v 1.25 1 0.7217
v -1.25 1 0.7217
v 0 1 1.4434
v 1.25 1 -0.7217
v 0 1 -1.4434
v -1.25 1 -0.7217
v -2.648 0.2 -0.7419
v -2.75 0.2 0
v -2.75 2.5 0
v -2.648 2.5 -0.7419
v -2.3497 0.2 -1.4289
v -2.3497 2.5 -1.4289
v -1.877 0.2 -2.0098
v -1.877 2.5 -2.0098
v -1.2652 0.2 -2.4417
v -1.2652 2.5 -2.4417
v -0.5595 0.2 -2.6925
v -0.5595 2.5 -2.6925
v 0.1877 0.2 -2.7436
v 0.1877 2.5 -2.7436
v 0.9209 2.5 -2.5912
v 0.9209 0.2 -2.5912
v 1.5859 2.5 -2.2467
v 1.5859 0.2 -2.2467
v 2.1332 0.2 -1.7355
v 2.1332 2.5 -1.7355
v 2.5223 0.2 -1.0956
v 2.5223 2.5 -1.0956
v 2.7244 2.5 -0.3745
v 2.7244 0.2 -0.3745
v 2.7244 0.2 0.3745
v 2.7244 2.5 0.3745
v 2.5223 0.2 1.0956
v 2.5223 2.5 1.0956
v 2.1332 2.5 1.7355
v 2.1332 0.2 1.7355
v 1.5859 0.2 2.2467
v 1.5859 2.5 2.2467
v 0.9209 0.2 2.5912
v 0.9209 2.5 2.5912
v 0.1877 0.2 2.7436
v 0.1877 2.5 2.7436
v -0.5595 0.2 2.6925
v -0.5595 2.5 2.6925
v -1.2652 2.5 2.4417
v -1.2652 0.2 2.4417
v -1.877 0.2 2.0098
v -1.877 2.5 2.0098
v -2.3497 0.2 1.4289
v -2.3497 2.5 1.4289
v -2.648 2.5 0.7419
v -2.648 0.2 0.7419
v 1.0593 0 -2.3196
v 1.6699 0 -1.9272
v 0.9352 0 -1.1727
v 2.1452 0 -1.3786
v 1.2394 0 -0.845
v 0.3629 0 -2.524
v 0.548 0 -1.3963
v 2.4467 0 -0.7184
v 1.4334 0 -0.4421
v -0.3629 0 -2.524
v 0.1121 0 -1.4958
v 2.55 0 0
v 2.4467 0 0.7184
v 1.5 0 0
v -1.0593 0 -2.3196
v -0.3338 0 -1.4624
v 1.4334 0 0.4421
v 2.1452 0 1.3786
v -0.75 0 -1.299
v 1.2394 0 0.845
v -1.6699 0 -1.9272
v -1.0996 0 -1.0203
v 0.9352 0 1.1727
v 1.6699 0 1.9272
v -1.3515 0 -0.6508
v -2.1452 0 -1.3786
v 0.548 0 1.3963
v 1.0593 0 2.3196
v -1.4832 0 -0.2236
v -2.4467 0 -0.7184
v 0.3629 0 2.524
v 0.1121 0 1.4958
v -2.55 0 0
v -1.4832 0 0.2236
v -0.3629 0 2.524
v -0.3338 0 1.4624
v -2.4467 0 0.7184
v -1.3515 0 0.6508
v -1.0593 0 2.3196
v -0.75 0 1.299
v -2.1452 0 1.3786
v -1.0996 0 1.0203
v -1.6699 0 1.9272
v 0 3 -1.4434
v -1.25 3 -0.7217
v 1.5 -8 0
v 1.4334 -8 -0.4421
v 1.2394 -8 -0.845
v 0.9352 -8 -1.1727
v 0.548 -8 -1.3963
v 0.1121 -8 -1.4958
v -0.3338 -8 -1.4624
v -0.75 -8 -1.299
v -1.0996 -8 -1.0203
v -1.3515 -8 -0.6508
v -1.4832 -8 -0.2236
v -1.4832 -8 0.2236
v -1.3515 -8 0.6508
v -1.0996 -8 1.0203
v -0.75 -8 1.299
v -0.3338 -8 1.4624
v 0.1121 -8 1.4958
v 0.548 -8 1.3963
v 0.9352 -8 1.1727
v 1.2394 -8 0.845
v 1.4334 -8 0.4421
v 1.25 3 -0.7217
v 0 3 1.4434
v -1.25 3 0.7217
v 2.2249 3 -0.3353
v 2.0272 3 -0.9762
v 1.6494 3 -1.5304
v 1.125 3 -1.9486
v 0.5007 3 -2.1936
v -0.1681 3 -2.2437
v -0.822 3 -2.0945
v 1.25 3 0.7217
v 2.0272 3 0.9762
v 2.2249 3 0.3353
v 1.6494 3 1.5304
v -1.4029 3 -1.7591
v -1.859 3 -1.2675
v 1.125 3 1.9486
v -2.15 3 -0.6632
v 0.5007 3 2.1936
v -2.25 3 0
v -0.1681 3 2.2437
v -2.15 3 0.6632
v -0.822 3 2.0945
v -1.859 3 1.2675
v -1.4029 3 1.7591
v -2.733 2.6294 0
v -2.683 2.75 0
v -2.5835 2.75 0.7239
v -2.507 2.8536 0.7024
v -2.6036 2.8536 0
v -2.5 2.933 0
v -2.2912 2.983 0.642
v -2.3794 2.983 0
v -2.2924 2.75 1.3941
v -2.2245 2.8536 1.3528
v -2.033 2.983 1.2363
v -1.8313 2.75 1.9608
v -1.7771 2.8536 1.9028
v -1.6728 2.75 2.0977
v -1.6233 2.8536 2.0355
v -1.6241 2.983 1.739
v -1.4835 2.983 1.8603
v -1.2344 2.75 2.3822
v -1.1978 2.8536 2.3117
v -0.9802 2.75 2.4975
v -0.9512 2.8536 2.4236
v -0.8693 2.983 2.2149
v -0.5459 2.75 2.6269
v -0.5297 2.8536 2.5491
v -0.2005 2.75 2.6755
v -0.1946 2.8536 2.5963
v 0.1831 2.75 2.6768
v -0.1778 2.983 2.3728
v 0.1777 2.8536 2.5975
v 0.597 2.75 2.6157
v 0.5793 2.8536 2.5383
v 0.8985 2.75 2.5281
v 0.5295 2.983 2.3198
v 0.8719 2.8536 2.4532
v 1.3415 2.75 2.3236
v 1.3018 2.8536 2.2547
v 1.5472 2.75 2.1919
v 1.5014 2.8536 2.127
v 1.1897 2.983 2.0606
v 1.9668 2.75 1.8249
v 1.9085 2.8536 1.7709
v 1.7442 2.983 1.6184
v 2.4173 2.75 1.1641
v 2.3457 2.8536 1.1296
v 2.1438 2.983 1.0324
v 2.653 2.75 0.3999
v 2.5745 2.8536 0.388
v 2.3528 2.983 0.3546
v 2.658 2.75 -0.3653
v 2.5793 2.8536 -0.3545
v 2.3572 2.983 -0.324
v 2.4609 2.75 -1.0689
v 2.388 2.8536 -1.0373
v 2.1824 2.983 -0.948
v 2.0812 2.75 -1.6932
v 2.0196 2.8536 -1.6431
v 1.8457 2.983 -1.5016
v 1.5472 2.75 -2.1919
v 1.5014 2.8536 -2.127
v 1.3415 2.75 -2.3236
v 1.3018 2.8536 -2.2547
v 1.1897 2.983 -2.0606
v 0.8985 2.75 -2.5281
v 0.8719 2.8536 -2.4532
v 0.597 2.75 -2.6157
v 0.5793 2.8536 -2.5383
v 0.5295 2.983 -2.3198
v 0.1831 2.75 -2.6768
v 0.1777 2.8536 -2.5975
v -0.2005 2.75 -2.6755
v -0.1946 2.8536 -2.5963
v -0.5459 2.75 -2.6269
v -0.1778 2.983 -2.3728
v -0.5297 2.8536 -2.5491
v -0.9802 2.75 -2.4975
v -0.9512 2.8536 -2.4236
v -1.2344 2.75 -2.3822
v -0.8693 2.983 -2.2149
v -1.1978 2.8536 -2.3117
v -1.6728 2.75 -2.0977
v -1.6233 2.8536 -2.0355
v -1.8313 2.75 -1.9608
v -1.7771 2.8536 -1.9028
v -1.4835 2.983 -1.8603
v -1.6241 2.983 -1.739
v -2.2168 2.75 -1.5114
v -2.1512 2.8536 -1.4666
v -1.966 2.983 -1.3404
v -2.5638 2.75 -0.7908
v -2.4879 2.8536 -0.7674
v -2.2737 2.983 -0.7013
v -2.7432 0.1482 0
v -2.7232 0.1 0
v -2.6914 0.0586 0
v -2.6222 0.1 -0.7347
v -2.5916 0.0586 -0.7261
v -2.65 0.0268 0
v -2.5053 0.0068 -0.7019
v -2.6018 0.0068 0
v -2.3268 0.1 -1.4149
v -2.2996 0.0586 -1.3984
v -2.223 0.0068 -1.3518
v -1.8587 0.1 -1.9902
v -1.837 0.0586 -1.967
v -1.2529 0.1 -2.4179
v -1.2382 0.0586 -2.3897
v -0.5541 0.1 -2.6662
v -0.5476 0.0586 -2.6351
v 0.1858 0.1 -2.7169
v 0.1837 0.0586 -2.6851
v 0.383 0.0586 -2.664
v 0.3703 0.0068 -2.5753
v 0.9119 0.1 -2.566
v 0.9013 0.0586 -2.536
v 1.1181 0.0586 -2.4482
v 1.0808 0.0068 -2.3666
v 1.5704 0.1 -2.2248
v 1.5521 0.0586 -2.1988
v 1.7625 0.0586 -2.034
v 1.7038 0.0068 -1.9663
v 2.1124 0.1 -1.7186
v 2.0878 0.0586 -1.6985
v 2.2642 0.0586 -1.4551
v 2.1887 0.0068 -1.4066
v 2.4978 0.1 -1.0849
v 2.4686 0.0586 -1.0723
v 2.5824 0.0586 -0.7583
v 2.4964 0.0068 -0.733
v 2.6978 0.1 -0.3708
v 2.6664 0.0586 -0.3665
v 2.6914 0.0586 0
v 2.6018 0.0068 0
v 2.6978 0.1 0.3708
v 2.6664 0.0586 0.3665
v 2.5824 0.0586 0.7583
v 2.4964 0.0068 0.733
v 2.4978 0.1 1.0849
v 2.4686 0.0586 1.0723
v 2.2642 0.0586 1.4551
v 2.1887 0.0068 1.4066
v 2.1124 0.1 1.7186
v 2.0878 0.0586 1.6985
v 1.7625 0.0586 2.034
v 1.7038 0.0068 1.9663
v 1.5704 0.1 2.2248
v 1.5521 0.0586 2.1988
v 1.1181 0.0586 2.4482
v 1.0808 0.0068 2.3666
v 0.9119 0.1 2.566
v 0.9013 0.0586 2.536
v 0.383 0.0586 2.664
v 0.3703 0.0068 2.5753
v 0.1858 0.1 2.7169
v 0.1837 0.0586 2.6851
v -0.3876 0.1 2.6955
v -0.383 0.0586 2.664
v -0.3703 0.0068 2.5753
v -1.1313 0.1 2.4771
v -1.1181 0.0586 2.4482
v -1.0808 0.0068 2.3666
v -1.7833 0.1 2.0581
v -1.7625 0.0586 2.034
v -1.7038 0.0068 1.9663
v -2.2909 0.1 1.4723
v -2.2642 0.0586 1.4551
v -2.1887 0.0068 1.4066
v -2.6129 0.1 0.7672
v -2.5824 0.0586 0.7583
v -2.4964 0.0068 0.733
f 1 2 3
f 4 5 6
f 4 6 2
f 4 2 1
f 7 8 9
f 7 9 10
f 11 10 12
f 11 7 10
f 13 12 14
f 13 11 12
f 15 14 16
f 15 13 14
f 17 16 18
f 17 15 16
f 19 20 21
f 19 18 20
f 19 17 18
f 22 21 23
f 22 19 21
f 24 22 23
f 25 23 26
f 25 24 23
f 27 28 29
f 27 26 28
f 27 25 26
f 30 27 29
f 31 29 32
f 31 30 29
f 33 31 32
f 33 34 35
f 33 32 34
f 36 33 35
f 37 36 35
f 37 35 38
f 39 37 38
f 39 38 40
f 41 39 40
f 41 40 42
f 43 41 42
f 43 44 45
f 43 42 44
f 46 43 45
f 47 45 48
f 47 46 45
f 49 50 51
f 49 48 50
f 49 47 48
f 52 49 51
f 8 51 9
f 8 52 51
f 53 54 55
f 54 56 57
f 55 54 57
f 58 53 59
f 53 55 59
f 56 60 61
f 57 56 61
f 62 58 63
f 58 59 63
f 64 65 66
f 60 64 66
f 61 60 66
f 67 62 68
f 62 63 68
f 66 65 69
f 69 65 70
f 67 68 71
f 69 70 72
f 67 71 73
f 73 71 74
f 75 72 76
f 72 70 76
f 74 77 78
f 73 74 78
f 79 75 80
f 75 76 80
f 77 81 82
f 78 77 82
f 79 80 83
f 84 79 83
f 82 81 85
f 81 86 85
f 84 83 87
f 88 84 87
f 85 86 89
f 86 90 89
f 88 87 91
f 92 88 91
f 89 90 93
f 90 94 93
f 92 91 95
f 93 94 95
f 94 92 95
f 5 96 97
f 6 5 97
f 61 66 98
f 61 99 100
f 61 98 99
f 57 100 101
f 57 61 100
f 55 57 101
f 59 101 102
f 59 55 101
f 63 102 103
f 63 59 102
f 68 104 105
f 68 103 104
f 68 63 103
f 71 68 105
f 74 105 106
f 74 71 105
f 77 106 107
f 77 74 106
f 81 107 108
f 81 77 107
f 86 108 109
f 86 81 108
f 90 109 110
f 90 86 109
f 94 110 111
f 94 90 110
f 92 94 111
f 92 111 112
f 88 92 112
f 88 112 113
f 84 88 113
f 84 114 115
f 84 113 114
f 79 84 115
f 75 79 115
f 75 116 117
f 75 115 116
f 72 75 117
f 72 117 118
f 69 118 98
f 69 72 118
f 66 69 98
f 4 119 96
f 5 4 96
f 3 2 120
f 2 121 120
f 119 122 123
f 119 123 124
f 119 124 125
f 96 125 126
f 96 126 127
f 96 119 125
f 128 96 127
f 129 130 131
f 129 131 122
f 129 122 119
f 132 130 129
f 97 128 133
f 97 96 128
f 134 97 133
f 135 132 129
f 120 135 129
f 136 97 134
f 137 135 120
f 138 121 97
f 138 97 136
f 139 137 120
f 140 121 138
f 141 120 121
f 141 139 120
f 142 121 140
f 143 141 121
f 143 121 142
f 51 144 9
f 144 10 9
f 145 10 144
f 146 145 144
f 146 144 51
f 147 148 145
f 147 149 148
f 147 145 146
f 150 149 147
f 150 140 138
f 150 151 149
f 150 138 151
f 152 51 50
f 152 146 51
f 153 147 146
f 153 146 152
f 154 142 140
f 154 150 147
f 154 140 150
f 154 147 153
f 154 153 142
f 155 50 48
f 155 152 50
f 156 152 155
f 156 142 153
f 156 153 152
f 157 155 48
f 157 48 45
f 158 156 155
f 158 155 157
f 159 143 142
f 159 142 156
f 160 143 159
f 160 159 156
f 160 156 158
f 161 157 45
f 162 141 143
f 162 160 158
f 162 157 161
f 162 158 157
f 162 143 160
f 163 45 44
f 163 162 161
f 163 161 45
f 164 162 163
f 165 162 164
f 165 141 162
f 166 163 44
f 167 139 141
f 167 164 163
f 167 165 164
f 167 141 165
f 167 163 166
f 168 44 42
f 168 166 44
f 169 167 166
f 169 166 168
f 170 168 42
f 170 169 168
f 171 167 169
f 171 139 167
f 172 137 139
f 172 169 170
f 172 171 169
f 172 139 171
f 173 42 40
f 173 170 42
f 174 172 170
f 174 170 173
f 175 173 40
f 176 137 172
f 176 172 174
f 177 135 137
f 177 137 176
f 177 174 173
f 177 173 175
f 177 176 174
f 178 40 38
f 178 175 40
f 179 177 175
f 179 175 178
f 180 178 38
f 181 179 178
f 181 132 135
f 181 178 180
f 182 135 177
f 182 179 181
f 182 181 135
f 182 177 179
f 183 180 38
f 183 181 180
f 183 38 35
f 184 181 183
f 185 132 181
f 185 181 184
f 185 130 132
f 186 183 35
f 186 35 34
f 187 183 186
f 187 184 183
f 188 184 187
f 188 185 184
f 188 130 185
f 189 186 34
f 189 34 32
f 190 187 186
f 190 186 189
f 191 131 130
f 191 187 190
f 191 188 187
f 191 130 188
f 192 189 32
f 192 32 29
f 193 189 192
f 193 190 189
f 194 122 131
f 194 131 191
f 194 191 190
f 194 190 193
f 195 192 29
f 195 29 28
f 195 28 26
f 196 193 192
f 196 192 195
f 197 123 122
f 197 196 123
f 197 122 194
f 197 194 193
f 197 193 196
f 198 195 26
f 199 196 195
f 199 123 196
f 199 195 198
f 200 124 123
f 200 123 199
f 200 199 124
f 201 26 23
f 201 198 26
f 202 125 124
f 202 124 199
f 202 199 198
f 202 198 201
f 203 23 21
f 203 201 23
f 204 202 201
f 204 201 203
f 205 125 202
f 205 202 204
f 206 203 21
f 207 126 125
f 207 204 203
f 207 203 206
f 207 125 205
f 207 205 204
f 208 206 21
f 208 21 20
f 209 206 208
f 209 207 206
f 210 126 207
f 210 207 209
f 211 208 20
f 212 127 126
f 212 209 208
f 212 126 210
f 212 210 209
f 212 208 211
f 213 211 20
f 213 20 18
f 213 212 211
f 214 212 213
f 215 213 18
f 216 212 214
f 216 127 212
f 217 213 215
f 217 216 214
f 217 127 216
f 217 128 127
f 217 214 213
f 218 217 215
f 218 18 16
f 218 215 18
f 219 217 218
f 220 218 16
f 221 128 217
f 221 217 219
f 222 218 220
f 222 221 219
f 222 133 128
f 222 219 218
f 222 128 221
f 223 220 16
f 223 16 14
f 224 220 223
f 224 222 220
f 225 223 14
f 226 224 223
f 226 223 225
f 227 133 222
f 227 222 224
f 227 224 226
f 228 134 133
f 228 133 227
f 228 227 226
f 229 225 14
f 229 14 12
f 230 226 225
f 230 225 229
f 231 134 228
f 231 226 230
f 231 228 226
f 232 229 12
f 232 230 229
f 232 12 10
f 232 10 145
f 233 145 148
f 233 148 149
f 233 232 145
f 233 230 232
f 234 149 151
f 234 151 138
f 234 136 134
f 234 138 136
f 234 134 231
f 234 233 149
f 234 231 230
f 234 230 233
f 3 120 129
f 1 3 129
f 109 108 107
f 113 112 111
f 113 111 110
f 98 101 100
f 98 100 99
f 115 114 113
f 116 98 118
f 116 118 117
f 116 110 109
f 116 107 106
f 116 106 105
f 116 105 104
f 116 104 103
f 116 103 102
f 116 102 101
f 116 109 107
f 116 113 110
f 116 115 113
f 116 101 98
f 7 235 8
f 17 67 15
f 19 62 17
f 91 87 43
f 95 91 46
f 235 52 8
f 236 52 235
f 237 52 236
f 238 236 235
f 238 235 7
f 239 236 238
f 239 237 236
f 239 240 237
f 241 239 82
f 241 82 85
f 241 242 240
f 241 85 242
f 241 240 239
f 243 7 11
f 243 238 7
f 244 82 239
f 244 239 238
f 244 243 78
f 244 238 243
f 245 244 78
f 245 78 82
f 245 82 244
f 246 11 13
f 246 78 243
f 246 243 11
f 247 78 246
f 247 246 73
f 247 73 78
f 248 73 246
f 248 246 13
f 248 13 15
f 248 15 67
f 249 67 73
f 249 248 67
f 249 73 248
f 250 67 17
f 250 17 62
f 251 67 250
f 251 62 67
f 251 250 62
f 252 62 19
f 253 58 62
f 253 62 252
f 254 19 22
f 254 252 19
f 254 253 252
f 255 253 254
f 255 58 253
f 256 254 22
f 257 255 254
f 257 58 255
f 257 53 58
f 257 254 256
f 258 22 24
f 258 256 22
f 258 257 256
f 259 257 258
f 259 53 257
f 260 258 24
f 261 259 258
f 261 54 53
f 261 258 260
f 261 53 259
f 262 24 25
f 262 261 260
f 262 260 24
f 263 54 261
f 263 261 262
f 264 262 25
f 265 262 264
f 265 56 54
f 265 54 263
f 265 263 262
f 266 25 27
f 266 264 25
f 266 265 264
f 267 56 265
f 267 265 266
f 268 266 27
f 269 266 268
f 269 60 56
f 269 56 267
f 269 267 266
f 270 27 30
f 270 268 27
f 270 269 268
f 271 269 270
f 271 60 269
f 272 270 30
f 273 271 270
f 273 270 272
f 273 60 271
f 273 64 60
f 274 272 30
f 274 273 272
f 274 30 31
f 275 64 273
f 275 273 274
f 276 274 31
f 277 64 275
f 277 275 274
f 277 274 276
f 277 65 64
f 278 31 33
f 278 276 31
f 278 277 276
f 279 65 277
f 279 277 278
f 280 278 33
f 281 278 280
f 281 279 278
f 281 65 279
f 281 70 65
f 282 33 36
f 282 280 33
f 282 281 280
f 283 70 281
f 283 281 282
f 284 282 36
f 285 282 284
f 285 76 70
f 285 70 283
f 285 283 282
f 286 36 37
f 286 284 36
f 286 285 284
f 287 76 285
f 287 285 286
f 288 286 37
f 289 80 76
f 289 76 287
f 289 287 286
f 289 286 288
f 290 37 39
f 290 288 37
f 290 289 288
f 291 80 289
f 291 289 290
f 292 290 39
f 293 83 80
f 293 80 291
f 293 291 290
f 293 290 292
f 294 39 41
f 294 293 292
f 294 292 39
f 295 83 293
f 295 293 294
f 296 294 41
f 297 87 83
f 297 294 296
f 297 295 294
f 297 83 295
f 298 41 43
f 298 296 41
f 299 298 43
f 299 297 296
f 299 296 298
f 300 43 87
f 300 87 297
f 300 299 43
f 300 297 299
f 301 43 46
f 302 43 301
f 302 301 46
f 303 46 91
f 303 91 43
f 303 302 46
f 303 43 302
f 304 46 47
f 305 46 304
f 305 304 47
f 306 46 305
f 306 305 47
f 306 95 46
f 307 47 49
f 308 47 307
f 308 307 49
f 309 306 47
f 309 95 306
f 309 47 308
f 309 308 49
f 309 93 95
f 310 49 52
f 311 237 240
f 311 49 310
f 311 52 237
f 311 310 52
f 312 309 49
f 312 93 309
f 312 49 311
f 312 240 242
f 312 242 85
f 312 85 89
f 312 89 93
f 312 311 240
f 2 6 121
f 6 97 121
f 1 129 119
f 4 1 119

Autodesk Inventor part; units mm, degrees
ref_plane "YZ Plane" through (0, 0, 0) normal (1, 0, 0) x (0, 1, 0)
ref_plane "XZ Plane" through (0, 0, 0) normal (0, 1, 0) x (-1, 0, 0)
ref_plane "XY Plane" through (0, 0, 0) normal (0, 0, 1) x (1, 0, 0)
sketch "スケッチ1" plane through (0, 0, 0) normal (0, 1, 0) x (-1, 0, 0)
  circle A0 centre (0, 0) radius 2.75
  dimension "d0" = 5.5
extrude "押し出し1" add sketch "スケッチ1" along normal blind 3
sketch "スケッチ2" plane through (0, 0, 0) normal (0, -1, 0) x (1, 0, 0)
  circle A0 centre (0, 0) radius 1.5
  dimension "d3" = 3
extrude "押し出し2" add sketch "スケッチ2" along normal blind 8
fillet "フィレット1" radius 0.5 1 edges at (2.75, 3, 0)
fillet "フィレット1" radius 0.2 1 edges at (2.75, 0, 0)
sketch "スケッチ3" plane through (0, 3, 0) normal (0, 1, 0) x (1, 0, 0)
  line L0 (0, 1.4434) -> (-1.25, 0.7217)
  line L1 (-1.25, 0.7217) -> (-1.25, -0.7217)
  line L2 (-1.25, -0.7217) -> (0, -1.4434)
  line L3 (0, -1.4434) -> (1.25, -0.7217)
  line L4 (1.25, -0.7217) -> (1.25, 0.7217)
  line L5 (1.25, 0.7217) -> (0, 1.4434)
  line L6 (0, 1.4434) -> (0, -1.4434) construction
  circle A0 centre (0, 0) radius 1.4434 construction
  dimension "d12" = 2.5
extrude "押し出し3" cut sketch "スケッチ3" against normal blind 2
thread "ねじ1" size "M3x0.5" class "6g" standard "ANSI Metric M Profile" full length
properties part number "M3-CapScrew"
